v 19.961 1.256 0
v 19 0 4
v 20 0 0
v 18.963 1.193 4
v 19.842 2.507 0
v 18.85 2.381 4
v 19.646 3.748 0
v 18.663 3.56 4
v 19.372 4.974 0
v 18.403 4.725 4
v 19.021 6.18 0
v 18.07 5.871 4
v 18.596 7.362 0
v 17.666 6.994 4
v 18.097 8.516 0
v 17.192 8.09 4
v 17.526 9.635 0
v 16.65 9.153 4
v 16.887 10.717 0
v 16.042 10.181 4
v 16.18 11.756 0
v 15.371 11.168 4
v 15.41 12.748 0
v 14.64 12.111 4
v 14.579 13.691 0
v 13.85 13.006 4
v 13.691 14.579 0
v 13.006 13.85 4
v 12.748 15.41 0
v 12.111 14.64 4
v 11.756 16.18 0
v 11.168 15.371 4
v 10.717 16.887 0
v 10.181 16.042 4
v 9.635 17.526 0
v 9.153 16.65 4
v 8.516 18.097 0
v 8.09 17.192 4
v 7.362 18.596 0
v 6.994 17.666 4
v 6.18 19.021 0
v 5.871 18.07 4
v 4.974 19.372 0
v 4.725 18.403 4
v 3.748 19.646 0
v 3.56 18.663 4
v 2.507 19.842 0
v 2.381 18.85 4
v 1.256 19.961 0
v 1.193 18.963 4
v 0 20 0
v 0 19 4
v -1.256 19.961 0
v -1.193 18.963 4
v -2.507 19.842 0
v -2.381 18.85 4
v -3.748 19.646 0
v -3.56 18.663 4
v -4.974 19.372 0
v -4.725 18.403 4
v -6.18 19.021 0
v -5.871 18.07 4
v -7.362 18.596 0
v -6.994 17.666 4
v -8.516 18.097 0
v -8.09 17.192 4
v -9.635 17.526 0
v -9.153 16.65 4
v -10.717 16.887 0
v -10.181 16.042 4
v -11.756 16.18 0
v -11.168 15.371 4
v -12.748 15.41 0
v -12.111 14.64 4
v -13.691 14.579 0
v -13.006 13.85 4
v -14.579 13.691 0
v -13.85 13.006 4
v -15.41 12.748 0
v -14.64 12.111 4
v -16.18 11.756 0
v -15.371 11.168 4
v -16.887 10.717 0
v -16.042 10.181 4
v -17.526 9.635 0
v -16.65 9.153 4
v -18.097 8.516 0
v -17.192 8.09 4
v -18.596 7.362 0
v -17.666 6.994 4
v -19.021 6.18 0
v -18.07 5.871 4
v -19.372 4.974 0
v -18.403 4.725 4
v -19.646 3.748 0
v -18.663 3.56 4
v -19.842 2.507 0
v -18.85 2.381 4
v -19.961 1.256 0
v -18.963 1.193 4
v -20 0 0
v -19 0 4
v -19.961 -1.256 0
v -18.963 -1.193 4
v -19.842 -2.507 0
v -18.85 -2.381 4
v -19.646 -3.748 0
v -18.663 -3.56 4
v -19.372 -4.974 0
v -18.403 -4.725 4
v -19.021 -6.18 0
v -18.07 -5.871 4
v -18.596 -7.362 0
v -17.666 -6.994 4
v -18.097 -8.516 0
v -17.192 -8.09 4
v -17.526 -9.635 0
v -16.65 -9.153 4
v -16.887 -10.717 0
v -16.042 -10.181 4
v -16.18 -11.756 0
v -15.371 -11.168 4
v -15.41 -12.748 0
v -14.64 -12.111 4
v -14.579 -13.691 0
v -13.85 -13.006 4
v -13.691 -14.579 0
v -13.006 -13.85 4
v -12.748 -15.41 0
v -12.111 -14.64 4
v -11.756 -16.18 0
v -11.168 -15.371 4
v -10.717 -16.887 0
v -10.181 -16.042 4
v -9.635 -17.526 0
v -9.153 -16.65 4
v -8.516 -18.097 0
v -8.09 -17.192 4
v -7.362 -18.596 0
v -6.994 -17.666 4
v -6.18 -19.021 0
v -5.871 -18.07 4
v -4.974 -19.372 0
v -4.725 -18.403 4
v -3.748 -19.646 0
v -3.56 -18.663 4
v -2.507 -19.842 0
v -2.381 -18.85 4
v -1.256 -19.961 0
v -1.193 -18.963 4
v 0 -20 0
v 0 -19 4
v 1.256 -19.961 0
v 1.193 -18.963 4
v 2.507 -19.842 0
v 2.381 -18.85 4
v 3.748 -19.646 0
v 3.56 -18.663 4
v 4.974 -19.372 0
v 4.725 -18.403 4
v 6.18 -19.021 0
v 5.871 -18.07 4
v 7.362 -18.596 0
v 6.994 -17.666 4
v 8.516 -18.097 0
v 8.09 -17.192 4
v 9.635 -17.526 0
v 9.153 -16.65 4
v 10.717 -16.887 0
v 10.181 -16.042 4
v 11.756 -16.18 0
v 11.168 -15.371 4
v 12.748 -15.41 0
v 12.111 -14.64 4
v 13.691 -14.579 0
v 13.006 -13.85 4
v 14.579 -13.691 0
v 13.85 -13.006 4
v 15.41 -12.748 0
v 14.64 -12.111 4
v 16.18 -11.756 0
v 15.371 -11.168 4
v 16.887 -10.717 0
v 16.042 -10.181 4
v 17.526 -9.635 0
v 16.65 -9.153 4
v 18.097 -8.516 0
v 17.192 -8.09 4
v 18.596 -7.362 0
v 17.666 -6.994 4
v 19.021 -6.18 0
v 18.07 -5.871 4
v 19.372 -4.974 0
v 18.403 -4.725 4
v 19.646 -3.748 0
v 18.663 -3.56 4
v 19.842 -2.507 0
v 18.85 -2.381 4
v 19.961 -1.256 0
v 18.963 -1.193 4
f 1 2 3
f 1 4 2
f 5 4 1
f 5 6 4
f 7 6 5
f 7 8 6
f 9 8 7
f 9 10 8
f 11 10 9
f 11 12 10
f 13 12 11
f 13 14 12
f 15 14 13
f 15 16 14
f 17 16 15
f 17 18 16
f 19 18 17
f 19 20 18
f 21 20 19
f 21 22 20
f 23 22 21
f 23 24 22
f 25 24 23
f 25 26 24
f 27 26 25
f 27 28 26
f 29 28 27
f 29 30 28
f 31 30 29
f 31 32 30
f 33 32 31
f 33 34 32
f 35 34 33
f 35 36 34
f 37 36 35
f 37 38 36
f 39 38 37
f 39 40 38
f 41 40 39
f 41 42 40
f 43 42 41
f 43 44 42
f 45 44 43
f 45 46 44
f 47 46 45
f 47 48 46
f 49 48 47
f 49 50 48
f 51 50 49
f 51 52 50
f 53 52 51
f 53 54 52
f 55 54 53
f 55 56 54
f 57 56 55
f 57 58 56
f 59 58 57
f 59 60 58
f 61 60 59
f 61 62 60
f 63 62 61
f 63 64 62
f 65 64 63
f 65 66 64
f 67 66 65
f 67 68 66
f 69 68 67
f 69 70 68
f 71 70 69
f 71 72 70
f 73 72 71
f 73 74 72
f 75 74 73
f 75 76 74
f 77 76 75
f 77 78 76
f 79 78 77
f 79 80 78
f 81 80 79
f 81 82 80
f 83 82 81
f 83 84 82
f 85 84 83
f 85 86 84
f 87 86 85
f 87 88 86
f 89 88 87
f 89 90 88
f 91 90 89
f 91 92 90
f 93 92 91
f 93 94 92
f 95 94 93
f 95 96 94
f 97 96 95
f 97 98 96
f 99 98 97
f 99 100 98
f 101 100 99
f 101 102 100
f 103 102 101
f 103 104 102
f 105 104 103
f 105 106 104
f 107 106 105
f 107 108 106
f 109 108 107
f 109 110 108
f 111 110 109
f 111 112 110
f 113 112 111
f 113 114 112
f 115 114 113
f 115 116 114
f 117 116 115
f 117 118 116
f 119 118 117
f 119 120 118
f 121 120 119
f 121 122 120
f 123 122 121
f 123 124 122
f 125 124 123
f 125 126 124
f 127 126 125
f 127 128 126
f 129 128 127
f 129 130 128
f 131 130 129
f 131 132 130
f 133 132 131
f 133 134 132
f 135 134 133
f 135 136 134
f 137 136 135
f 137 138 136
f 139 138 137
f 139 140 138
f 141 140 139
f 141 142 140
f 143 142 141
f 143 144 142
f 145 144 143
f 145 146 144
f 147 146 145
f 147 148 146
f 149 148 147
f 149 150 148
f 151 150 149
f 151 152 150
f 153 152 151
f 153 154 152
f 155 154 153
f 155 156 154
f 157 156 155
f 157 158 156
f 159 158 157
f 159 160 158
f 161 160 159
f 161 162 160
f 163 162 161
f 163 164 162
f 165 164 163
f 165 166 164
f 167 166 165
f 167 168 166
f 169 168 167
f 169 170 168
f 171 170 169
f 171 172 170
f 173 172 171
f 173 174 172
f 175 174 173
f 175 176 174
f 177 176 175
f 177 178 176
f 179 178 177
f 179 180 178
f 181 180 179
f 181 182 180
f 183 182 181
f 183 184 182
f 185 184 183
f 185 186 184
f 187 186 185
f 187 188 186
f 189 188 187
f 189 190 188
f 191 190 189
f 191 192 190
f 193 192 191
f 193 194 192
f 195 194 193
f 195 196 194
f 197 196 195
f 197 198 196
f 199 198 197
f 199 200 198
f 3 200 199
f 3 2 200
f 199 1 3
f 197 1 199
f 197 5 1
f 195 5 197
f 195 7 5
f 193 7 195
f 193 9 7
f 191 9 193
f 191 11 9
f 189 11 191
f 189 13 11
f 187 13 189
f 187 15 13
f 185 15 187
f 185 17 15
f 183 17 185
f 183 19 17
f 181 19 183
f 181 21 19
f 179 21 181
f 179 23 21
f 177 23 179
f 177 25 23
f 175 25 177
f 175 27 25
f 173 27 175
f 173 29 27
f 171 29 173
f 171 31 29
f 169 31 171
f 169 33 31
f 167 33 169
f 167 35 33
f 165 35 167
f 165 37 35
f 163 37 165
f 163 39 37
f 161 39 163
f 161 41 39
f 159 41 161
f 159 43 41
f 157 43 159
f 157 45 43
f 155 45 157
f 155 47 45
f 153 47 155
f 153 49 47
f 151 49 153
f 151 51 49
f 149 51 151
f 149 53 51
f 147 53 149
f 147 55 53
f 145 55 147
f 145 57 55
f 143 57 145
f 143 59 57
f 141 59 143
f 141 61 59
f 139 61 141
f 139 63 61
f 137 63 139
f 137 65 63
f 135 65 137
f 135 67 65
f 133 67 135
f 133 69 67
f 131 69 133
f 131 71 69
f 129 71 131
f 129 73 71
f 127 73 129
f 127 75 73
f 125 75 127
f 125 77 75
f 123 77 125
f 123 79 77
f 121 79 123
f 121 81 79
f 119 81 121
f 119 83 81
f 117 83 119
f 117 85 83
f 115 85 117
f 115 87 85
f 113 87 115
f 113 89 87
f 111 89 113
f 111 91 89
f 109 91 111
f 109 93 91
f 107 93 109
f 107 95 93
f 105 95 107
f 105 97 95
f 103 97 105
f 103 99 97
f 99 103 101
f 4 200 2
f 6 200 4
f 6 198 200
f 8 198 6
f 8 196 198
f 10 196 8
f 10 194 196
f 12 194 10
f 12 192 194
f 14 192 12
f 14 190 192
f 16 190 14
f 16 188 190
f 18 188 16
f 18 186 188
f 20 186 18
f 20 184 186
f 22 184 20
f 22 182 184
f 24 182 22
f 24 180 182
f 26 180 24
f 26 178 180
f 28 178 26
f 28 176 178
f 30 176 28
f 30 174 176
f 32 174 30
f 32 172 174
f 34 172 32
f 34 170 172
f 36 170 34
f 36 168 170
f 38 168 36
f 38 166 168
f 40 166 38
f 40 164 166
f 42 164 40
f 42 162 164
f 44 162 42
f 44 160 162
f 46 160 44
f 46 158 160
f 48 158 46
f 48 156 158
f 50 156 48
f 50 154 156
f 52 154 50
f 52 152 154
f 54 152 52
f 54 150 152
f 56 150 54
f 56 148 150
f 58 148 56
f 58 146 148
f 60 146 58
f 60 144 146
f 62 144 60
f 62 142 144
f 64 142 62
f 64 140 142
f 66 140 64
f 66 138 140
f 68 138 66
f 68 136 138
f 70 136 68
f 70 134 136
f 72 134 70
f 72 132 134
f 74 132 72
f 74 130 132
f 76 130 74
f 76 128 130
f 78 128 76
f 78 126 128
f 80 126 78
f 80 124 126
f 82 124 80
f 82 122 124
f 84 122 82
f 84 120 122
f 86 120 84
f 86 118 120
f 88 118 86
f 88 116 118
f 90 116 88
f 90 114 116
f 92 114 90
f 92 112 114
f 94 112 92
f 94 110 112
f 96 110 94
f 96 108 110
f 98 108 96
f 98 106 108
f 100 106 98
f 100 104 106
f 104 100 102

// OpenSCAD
// file: ../build.scad
$build_id = "";

function building(filename) = is_undef(filename) ?
  !is_undef(build)
  : !is_undef(build) && build == filename;

function previewing() = !building();

module build(filename) {
  $build_id = filename;

  if(!is_undef(scad_build_scan) && scad_build_scan == true) {
    echo(str("scad_build_scan: ", filename));
  }
  else if(previewing() || build == filename) {
    children();
  }
}

module preview_row(spacing) {
  if(previewing()) {
    for(x = [0:1:$children - 1]) {
      translate([x * spacing, 0, 0]) {
        children(x);
      }
    }
  }
  else {
    children();
  }
}

module preview_column(spacing) {
  if(previewing()) {
    for(y = [0:1:$children - 1]) {
      translate([0, y * spacing, 0]) {
        children(y);
      }
    }
  }
  else {
    children();
  }
}
// file: ../minibase.scad
// Based off of titancraft's Customizable Miniature Base (CC0 1.0)
// https://www.thingiverse.com/thing:1112237

include <./build.scad>

$base_rim = 1; //	[1: tapered, 2: inclined, 3: flat]
// Number of sides:
$base_shape = 100; //	[30:Low-res Circle, 100: Hi-res Circle, 5:Pentagon, 6:Hexagon, 8:Octagon, 4:Square, 3:Triangle]

$base_diameter = 32;
$base_height = 4;
$base_slant = 95;

// Percentage:
$base_stretch = 100;

//(tapered base only)
$base_inner_circle_ratio = 40;

module tapered(r=40) {
  $base_rim = 1;
  $base_inner_circle_ratio = r;

  children();
}

module inclined() {
  $base_rim = 2;

  children();
}

module flat() {
  $base_rim = 3;

  children();
}

module shape(s) {
  $base_shape = s;

  children();
}

module diameter(d) {
  $base_diameter = d;

  children();
}

module height(h) {
  $base_height = h;

  children();
}

module slant(s) {
  $base_slant = s;

  children();
}

module stretch(s) {
  $base_stretch = s;

  children();
}

module base(id) {
  build(id) union() {
    radius = $base_diameter/2;
    scale([$base_stretch/100, 1, 1]){
      if ($base_rim == 1){
        // tapered base
        cyl1_height = $base_height * (1-$base_inner_circle_ratio/100);
        cylinder(cyl1_height, radius, radius * $base_slant/100, $fn=$base_shape);

        cyl2_radius = radius  * $base_slant/100 * .95;
        cyl2_height = $base_height - cyl1_height;

        translate([0, 0, cyl1_height]){
          cylinder(cyl2_height, cyl2_radius, cyl2_radius * $base_slant/100, $fn=$base_shape);
          cylinder(cyl2_height*.5, radius * $base_slant/100, cyl2_radius, $fn=$base_shape);
        }
      } else if ($base_rim == 2){
        // inclined base
        cylinder($base_height, radius, radius * $base_slant/100, $fn=$base_shape);
      } else if ($base_rim == 3){
        // flat base

        cylinder($base_height, radius, radius, $fn=$base_shape);
      }
    }
  }
}
// main file
include <../minibase.scad>

inclined() diameter(40) base("40mm-opr-infantry-large");
